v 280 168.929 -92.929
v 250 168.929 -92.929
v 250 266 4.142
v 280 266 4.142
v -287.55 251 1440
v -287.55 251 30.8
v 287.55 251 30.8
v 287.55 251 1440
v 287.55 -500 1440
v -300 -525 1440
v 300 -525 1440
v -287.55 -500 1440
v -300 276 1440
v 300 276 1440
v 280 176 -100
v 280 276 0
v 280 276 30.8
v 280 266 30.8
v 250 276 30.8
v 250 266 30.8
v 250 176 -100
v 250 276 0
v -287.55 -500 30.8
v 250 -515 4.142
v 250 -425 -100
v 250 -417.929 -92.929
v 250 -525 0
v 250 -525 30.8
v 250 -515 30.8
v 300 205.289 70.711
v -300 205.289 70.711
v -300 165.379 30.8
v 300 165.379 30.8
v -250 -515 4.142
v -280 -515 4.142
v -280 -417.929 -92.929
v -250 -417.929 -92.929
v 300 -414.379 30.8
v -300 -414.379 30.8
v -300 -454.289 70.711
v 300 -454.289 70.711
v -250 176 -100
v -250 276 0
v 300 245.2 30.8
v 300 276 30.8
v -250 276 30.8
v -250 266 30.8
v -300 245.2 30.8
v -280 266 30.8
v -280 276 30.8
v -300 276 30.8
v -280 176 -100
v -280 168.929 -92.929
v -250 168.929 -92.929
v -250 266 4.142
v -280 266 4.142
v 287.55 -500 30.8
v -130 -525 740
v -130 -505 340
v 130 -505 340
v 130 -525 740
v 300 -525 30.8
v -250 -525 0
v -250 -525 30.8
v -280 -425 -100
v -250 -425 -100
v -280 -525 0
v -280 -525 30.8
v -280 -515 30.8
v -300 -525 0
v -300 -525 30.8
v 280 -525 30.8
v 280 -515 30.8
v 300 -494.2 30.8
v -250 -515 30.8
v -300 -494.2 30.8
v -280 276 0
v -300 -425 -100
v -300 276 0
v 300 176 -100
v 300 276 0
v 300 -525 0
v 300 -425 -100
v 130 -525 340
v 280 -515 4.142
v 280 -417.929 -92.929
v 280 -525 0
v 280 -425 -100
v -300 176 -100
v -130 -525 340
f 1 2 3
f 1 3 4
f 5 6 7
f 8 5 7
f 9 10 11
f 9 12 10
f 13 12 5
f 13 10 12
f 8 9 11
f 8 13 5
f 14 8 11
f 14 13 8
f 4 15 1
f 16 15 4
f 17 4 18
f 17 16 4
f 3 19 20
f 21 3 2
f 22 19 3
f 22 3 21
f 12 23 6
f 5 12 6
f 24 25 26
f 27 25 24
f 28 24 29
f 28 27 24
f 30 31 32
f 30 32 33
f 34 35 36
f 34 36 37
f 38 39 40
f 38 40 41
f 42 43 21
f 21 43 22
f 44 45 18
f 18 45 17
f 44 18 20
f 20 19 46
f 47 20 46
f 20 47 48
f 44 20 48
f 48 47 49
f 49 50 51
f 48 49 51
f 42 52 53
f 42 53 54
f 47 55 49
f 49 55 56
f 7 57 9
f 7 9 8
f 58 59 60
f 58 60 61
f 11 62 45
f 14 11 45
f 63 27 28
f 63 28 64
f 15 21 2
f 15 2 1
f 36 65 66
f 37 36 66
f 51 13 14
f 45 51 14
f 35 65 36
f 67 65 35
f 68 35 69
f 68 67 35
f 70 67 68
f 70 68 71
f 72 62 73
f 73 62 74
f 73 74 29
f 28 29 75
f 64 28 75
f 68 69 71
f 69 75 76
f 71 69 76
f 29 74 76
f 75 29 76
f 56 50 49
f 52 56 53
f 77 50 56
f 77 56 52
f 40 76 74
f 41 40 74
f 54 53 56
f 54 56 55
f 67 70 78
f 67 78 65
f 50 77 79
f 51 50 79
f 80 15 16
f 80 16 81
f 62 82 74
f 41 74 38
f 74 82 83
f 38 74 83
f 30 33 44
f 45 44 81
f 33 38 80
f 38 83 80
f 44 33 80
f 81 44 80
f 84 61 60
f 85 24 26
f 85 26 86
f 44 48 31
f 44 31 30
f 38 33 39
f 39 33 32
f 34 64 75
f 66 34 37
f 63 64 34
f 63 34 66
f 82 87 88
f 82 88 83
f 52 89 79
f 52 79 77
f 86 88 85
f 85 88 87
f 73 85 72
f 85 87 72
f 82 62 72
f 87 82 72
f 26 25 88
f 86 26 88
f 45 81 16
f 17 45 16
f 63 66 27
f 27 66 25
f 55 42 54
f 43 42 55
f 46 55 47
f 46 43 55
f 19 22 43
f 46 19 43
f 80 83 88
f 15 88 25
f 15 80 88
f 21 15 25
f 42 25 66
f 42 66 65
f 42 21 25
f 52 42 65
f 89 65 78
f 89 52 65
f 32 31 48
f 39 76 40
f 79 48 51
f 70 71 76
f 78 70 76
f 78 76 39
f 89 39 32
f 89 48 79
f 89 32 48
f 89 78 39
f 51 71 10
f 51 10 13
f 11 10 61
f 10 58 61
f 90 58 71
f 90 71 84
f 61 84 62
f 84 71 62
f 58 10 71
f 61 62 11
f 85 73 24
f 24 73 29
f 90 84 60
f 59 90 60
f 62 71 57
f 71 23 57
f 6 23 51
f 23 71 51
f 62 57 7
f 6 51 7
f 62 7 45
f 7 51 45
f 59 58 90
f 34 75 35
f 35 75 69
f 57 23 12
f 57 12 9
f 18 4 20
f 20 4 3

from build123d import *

# Parameters (mm, degrees)
SKETCH1_W               = 600
SKETCH1_H               = 801
BOSS_EXTRUDE1_DEPTH     = 30.8
SKETCH2_W               = 600
SKETCH2_H               = 801
SKETCH2_W_2             = 575.1
SKETCH2_H_2             = 751
BOSS_EXTRUDE2_DEPTH     = 1409.2
SKETCH3_W               = 600
SKETCH3_H               = 601
BOSS_EXTRUDE3_DEPTH     = 100
SKETCH4_W               = 600
SKETCH4_H               = 141.421356237
BOSS_EXTRUDE4_DEPTH     = 100
SKETCH5_W               = 600
SKETCH5_H               = 141.421356237
BOSS_EXTRUDE5_DEPTH     = 100
CUT_EXTRUDE1_DEPTH      = 10
SKETCH7_W               = 30
SKETCH7_H               = 141.421356237
CUT_EXTRUDE2_DEPTH      = 10
CUT_EXTRUDE3_DEPTH      = 10
SKETCH9_W               = 30
SKETCH9_H               = 141.421356237
CUT_EXTRUDE4_DEPTH      = 10
CUT_EXTRUDE5_DEPTH      = 130
CUT_EXTRUDE5_DEPTH_BACK = 130


with BuildPart() as part:
    # Sketch1 → Boss-Extrude1 (new body)
    with BuildSketch(Plane(origin=(0, 0, 0), x_dir=(-1, 0, 0), z_dir=(0, 0, -1))):
        with Locations((0, -124.5)):
            Rectangle(SKETCH1_W, SKETCH1_H)
    extrude(amount=-BOSS_EXTRUDE1_DEPTH)

    # Sketch3 → Boss-Extrude3 (add)
    with BuildSketch(Plane(origin=(0, 0, 0), x_dir=(-1, 0, 0), z_dir=(0, 0, -1))):
        with Locations((0, -124.5)):
            Rectangle(SKETCH3_W, SKETCH3_H)
    extrude(amount=BOSS_EXTRUDE3_DEPTH)

    # Sketch4 → Boss-Extrude4 (add)
    with BuildSketch(Plane(origin=(0, 138, -138), x_dir=(1, 0, 0), z_dir=(0, -0.7071067811865475, 0.7071067811865477))):
        with Locations((0, 124.450793489)):
            Rectangle(SKETCH4_W, SKETCH4_H)
    extrude(amount=BOSS_EXTRUDE4_DEPTH)

    # Sketch5 → Boss-Extrude5 (add)
    with BuildSketch(Plane(origin=(0, -262.5, -262.5), x_dir=(1, 0, 0), z_dir=(0, 0.7071067811865476, 0.7071067811865476))):
        with Locations((0, -300.520382004)):
            Rectangle(SKETCH5_W, SKETCH5_H)
    extrude(amount=BOSS_EXTRUDE5_DEPTH)

    # Sketch6 → Cut-Extrude1 (cut)
    with BuildSketch(Plane.XZ.offset(525)):
        with BuildLine():
            Line((280, 0), (250, 0))
            Line((250, 0), (250, 1345))
            ThreePointArc((250, 1345), (242.67766953, 1362.67766953), (225, 1370))
            Line((225, 1370), (-225, 1370))
            ThreePointArc((-225, 1370), (-242.67766953, 1362.67766953), (-250, 1345))
            Line((-250, 1345), (-250, 0))
            Line((-250, 0), (-280, 0))
            Line((-280, 0), (-280, 1375))
            ThreePointArc((-280, 1375), (-272.67766953, 1392.67766953), (-255, 1400))
            Line((-255, 1400), (255, 1400))
            ThreePointArc((255, 1400), (272.67766953, 1392.67766953), (280, 1375))
            Line((280, 1375), (280, 0))
        make_face()
    extrude(amount=-CUT_EXTRUDE1_DEPTH, mode=Mode.SUBTRACT)

    # Sketch7 → Cut-Extrude2 (cut)
    with BuildSketch(Plane(origin=(0, -262.5, -262.5), x_dir=(1, 0, 0), z_dir=(0, -0.7071067811865477, -0.7071067811865475))):
        with Locations((-265, 300.520382004)):
            Rectangle(SKETCH7_W, SKETCH7_H)
        with Locations((265, 300.520382004)):
            Rectangle(SKETCH7_W, SKETCH7_H)
    extrude(amount=-CUT_EXTRUDE2_DEPTH, mode=Mode.SUBTRACT)

    # Sketch8 → Cut-Extrude3 (cut)
    with BuildSketch(Plane(origin=(0, 276, 0), x_dir=(1, 0, 0), z_dir=(0, 1, 0))):
        with BuildLine():
            Line((-280, 0), (-250, 0))
            Line((-250, 0), (-250, -1345))
            ThreePointArc((-250, -1345), (-242.67766953, -1362.67766953), (-225, -1370))
            Line((-225, -1370), (225, -1370))
            ThreePointArc((225, -1370), (242.67766953, -1362.67766953), (250, -1345))
            Line((250, -1345), (250, 0))
            Line((250, 0), (280, 0))
            Line((280, 0), (280, -1375))
            ThreePointArc((280, -1375), (272.67766953, -1392.67766953), (255, -1400))
            Line((255, -1400), (-255, -1400))
            ThreePointArc((-255, -1400), (-272.67766953, -1392.67766953), (-280, -1375))
            Line((-280, -1375), (-280, 0))
        make_face()
    extrude(amount=-CUT_EXTRUDE3_DEPTH, mode=Mode.SUBTRACT)

    # Sketch9 → Cut-Extrude4 (cut)
    with BuildSketch(Plane(origin=(0, 138, -138), x_dir=(1, 0, 0), z_dir=(0, 0.7071067811865472, -0.7071067811865479))):
        with Locations((-265, -124.450793489)):
            Rectangle(SKETCH9_W, SKETCH9_H)
        with Locations((265, -124.450793489)):
            Rectangle(SKETCH9_W, SKETCH9_H)
    extrude(amount=-CUT_EXTRUDE4_DEPTH, mode=Mode.SUBTRACT)


with BuildPart() as body_2:
    # Sketch2 → Boss-Extrude2 (new body)
    with BuildSketch(Plane.XY.offset(30.8)):
        with Locations((0, -124.5)):
            Rectangle(SKETCH2_W, SKETCH2_H)
        with Locations((0, -124.5)):
            Rectangle(SKETCH2_W_2, SKETCH2_H_2, mode=Mode.SUBTRACT)
    extrude(amount=BOSS_EXTRUDE2_DEPTH)

    # Sketch12 → Cut-Extrude5 (cut, two sides: drawn at the far end of the back side and taken through both)
    with BuildSketch(Plane(origin=(0, 0, 0), x_dir=(0, 0, -1), z_dir=(1, 0, 0)).offset(-CUT_EXTRUDE5_DEPTH_BACK)):
        Polygon((-740, -525), (-340, -525), (-340, -505), align=None)
    extrude(amount=CUT_EXTRUDE5_DEPTH + CUT_EXTRUDE5_DEPTH_BACK, mode=Mode.SUBTRACT)


solid = Compound([part.part, body_2.part])
